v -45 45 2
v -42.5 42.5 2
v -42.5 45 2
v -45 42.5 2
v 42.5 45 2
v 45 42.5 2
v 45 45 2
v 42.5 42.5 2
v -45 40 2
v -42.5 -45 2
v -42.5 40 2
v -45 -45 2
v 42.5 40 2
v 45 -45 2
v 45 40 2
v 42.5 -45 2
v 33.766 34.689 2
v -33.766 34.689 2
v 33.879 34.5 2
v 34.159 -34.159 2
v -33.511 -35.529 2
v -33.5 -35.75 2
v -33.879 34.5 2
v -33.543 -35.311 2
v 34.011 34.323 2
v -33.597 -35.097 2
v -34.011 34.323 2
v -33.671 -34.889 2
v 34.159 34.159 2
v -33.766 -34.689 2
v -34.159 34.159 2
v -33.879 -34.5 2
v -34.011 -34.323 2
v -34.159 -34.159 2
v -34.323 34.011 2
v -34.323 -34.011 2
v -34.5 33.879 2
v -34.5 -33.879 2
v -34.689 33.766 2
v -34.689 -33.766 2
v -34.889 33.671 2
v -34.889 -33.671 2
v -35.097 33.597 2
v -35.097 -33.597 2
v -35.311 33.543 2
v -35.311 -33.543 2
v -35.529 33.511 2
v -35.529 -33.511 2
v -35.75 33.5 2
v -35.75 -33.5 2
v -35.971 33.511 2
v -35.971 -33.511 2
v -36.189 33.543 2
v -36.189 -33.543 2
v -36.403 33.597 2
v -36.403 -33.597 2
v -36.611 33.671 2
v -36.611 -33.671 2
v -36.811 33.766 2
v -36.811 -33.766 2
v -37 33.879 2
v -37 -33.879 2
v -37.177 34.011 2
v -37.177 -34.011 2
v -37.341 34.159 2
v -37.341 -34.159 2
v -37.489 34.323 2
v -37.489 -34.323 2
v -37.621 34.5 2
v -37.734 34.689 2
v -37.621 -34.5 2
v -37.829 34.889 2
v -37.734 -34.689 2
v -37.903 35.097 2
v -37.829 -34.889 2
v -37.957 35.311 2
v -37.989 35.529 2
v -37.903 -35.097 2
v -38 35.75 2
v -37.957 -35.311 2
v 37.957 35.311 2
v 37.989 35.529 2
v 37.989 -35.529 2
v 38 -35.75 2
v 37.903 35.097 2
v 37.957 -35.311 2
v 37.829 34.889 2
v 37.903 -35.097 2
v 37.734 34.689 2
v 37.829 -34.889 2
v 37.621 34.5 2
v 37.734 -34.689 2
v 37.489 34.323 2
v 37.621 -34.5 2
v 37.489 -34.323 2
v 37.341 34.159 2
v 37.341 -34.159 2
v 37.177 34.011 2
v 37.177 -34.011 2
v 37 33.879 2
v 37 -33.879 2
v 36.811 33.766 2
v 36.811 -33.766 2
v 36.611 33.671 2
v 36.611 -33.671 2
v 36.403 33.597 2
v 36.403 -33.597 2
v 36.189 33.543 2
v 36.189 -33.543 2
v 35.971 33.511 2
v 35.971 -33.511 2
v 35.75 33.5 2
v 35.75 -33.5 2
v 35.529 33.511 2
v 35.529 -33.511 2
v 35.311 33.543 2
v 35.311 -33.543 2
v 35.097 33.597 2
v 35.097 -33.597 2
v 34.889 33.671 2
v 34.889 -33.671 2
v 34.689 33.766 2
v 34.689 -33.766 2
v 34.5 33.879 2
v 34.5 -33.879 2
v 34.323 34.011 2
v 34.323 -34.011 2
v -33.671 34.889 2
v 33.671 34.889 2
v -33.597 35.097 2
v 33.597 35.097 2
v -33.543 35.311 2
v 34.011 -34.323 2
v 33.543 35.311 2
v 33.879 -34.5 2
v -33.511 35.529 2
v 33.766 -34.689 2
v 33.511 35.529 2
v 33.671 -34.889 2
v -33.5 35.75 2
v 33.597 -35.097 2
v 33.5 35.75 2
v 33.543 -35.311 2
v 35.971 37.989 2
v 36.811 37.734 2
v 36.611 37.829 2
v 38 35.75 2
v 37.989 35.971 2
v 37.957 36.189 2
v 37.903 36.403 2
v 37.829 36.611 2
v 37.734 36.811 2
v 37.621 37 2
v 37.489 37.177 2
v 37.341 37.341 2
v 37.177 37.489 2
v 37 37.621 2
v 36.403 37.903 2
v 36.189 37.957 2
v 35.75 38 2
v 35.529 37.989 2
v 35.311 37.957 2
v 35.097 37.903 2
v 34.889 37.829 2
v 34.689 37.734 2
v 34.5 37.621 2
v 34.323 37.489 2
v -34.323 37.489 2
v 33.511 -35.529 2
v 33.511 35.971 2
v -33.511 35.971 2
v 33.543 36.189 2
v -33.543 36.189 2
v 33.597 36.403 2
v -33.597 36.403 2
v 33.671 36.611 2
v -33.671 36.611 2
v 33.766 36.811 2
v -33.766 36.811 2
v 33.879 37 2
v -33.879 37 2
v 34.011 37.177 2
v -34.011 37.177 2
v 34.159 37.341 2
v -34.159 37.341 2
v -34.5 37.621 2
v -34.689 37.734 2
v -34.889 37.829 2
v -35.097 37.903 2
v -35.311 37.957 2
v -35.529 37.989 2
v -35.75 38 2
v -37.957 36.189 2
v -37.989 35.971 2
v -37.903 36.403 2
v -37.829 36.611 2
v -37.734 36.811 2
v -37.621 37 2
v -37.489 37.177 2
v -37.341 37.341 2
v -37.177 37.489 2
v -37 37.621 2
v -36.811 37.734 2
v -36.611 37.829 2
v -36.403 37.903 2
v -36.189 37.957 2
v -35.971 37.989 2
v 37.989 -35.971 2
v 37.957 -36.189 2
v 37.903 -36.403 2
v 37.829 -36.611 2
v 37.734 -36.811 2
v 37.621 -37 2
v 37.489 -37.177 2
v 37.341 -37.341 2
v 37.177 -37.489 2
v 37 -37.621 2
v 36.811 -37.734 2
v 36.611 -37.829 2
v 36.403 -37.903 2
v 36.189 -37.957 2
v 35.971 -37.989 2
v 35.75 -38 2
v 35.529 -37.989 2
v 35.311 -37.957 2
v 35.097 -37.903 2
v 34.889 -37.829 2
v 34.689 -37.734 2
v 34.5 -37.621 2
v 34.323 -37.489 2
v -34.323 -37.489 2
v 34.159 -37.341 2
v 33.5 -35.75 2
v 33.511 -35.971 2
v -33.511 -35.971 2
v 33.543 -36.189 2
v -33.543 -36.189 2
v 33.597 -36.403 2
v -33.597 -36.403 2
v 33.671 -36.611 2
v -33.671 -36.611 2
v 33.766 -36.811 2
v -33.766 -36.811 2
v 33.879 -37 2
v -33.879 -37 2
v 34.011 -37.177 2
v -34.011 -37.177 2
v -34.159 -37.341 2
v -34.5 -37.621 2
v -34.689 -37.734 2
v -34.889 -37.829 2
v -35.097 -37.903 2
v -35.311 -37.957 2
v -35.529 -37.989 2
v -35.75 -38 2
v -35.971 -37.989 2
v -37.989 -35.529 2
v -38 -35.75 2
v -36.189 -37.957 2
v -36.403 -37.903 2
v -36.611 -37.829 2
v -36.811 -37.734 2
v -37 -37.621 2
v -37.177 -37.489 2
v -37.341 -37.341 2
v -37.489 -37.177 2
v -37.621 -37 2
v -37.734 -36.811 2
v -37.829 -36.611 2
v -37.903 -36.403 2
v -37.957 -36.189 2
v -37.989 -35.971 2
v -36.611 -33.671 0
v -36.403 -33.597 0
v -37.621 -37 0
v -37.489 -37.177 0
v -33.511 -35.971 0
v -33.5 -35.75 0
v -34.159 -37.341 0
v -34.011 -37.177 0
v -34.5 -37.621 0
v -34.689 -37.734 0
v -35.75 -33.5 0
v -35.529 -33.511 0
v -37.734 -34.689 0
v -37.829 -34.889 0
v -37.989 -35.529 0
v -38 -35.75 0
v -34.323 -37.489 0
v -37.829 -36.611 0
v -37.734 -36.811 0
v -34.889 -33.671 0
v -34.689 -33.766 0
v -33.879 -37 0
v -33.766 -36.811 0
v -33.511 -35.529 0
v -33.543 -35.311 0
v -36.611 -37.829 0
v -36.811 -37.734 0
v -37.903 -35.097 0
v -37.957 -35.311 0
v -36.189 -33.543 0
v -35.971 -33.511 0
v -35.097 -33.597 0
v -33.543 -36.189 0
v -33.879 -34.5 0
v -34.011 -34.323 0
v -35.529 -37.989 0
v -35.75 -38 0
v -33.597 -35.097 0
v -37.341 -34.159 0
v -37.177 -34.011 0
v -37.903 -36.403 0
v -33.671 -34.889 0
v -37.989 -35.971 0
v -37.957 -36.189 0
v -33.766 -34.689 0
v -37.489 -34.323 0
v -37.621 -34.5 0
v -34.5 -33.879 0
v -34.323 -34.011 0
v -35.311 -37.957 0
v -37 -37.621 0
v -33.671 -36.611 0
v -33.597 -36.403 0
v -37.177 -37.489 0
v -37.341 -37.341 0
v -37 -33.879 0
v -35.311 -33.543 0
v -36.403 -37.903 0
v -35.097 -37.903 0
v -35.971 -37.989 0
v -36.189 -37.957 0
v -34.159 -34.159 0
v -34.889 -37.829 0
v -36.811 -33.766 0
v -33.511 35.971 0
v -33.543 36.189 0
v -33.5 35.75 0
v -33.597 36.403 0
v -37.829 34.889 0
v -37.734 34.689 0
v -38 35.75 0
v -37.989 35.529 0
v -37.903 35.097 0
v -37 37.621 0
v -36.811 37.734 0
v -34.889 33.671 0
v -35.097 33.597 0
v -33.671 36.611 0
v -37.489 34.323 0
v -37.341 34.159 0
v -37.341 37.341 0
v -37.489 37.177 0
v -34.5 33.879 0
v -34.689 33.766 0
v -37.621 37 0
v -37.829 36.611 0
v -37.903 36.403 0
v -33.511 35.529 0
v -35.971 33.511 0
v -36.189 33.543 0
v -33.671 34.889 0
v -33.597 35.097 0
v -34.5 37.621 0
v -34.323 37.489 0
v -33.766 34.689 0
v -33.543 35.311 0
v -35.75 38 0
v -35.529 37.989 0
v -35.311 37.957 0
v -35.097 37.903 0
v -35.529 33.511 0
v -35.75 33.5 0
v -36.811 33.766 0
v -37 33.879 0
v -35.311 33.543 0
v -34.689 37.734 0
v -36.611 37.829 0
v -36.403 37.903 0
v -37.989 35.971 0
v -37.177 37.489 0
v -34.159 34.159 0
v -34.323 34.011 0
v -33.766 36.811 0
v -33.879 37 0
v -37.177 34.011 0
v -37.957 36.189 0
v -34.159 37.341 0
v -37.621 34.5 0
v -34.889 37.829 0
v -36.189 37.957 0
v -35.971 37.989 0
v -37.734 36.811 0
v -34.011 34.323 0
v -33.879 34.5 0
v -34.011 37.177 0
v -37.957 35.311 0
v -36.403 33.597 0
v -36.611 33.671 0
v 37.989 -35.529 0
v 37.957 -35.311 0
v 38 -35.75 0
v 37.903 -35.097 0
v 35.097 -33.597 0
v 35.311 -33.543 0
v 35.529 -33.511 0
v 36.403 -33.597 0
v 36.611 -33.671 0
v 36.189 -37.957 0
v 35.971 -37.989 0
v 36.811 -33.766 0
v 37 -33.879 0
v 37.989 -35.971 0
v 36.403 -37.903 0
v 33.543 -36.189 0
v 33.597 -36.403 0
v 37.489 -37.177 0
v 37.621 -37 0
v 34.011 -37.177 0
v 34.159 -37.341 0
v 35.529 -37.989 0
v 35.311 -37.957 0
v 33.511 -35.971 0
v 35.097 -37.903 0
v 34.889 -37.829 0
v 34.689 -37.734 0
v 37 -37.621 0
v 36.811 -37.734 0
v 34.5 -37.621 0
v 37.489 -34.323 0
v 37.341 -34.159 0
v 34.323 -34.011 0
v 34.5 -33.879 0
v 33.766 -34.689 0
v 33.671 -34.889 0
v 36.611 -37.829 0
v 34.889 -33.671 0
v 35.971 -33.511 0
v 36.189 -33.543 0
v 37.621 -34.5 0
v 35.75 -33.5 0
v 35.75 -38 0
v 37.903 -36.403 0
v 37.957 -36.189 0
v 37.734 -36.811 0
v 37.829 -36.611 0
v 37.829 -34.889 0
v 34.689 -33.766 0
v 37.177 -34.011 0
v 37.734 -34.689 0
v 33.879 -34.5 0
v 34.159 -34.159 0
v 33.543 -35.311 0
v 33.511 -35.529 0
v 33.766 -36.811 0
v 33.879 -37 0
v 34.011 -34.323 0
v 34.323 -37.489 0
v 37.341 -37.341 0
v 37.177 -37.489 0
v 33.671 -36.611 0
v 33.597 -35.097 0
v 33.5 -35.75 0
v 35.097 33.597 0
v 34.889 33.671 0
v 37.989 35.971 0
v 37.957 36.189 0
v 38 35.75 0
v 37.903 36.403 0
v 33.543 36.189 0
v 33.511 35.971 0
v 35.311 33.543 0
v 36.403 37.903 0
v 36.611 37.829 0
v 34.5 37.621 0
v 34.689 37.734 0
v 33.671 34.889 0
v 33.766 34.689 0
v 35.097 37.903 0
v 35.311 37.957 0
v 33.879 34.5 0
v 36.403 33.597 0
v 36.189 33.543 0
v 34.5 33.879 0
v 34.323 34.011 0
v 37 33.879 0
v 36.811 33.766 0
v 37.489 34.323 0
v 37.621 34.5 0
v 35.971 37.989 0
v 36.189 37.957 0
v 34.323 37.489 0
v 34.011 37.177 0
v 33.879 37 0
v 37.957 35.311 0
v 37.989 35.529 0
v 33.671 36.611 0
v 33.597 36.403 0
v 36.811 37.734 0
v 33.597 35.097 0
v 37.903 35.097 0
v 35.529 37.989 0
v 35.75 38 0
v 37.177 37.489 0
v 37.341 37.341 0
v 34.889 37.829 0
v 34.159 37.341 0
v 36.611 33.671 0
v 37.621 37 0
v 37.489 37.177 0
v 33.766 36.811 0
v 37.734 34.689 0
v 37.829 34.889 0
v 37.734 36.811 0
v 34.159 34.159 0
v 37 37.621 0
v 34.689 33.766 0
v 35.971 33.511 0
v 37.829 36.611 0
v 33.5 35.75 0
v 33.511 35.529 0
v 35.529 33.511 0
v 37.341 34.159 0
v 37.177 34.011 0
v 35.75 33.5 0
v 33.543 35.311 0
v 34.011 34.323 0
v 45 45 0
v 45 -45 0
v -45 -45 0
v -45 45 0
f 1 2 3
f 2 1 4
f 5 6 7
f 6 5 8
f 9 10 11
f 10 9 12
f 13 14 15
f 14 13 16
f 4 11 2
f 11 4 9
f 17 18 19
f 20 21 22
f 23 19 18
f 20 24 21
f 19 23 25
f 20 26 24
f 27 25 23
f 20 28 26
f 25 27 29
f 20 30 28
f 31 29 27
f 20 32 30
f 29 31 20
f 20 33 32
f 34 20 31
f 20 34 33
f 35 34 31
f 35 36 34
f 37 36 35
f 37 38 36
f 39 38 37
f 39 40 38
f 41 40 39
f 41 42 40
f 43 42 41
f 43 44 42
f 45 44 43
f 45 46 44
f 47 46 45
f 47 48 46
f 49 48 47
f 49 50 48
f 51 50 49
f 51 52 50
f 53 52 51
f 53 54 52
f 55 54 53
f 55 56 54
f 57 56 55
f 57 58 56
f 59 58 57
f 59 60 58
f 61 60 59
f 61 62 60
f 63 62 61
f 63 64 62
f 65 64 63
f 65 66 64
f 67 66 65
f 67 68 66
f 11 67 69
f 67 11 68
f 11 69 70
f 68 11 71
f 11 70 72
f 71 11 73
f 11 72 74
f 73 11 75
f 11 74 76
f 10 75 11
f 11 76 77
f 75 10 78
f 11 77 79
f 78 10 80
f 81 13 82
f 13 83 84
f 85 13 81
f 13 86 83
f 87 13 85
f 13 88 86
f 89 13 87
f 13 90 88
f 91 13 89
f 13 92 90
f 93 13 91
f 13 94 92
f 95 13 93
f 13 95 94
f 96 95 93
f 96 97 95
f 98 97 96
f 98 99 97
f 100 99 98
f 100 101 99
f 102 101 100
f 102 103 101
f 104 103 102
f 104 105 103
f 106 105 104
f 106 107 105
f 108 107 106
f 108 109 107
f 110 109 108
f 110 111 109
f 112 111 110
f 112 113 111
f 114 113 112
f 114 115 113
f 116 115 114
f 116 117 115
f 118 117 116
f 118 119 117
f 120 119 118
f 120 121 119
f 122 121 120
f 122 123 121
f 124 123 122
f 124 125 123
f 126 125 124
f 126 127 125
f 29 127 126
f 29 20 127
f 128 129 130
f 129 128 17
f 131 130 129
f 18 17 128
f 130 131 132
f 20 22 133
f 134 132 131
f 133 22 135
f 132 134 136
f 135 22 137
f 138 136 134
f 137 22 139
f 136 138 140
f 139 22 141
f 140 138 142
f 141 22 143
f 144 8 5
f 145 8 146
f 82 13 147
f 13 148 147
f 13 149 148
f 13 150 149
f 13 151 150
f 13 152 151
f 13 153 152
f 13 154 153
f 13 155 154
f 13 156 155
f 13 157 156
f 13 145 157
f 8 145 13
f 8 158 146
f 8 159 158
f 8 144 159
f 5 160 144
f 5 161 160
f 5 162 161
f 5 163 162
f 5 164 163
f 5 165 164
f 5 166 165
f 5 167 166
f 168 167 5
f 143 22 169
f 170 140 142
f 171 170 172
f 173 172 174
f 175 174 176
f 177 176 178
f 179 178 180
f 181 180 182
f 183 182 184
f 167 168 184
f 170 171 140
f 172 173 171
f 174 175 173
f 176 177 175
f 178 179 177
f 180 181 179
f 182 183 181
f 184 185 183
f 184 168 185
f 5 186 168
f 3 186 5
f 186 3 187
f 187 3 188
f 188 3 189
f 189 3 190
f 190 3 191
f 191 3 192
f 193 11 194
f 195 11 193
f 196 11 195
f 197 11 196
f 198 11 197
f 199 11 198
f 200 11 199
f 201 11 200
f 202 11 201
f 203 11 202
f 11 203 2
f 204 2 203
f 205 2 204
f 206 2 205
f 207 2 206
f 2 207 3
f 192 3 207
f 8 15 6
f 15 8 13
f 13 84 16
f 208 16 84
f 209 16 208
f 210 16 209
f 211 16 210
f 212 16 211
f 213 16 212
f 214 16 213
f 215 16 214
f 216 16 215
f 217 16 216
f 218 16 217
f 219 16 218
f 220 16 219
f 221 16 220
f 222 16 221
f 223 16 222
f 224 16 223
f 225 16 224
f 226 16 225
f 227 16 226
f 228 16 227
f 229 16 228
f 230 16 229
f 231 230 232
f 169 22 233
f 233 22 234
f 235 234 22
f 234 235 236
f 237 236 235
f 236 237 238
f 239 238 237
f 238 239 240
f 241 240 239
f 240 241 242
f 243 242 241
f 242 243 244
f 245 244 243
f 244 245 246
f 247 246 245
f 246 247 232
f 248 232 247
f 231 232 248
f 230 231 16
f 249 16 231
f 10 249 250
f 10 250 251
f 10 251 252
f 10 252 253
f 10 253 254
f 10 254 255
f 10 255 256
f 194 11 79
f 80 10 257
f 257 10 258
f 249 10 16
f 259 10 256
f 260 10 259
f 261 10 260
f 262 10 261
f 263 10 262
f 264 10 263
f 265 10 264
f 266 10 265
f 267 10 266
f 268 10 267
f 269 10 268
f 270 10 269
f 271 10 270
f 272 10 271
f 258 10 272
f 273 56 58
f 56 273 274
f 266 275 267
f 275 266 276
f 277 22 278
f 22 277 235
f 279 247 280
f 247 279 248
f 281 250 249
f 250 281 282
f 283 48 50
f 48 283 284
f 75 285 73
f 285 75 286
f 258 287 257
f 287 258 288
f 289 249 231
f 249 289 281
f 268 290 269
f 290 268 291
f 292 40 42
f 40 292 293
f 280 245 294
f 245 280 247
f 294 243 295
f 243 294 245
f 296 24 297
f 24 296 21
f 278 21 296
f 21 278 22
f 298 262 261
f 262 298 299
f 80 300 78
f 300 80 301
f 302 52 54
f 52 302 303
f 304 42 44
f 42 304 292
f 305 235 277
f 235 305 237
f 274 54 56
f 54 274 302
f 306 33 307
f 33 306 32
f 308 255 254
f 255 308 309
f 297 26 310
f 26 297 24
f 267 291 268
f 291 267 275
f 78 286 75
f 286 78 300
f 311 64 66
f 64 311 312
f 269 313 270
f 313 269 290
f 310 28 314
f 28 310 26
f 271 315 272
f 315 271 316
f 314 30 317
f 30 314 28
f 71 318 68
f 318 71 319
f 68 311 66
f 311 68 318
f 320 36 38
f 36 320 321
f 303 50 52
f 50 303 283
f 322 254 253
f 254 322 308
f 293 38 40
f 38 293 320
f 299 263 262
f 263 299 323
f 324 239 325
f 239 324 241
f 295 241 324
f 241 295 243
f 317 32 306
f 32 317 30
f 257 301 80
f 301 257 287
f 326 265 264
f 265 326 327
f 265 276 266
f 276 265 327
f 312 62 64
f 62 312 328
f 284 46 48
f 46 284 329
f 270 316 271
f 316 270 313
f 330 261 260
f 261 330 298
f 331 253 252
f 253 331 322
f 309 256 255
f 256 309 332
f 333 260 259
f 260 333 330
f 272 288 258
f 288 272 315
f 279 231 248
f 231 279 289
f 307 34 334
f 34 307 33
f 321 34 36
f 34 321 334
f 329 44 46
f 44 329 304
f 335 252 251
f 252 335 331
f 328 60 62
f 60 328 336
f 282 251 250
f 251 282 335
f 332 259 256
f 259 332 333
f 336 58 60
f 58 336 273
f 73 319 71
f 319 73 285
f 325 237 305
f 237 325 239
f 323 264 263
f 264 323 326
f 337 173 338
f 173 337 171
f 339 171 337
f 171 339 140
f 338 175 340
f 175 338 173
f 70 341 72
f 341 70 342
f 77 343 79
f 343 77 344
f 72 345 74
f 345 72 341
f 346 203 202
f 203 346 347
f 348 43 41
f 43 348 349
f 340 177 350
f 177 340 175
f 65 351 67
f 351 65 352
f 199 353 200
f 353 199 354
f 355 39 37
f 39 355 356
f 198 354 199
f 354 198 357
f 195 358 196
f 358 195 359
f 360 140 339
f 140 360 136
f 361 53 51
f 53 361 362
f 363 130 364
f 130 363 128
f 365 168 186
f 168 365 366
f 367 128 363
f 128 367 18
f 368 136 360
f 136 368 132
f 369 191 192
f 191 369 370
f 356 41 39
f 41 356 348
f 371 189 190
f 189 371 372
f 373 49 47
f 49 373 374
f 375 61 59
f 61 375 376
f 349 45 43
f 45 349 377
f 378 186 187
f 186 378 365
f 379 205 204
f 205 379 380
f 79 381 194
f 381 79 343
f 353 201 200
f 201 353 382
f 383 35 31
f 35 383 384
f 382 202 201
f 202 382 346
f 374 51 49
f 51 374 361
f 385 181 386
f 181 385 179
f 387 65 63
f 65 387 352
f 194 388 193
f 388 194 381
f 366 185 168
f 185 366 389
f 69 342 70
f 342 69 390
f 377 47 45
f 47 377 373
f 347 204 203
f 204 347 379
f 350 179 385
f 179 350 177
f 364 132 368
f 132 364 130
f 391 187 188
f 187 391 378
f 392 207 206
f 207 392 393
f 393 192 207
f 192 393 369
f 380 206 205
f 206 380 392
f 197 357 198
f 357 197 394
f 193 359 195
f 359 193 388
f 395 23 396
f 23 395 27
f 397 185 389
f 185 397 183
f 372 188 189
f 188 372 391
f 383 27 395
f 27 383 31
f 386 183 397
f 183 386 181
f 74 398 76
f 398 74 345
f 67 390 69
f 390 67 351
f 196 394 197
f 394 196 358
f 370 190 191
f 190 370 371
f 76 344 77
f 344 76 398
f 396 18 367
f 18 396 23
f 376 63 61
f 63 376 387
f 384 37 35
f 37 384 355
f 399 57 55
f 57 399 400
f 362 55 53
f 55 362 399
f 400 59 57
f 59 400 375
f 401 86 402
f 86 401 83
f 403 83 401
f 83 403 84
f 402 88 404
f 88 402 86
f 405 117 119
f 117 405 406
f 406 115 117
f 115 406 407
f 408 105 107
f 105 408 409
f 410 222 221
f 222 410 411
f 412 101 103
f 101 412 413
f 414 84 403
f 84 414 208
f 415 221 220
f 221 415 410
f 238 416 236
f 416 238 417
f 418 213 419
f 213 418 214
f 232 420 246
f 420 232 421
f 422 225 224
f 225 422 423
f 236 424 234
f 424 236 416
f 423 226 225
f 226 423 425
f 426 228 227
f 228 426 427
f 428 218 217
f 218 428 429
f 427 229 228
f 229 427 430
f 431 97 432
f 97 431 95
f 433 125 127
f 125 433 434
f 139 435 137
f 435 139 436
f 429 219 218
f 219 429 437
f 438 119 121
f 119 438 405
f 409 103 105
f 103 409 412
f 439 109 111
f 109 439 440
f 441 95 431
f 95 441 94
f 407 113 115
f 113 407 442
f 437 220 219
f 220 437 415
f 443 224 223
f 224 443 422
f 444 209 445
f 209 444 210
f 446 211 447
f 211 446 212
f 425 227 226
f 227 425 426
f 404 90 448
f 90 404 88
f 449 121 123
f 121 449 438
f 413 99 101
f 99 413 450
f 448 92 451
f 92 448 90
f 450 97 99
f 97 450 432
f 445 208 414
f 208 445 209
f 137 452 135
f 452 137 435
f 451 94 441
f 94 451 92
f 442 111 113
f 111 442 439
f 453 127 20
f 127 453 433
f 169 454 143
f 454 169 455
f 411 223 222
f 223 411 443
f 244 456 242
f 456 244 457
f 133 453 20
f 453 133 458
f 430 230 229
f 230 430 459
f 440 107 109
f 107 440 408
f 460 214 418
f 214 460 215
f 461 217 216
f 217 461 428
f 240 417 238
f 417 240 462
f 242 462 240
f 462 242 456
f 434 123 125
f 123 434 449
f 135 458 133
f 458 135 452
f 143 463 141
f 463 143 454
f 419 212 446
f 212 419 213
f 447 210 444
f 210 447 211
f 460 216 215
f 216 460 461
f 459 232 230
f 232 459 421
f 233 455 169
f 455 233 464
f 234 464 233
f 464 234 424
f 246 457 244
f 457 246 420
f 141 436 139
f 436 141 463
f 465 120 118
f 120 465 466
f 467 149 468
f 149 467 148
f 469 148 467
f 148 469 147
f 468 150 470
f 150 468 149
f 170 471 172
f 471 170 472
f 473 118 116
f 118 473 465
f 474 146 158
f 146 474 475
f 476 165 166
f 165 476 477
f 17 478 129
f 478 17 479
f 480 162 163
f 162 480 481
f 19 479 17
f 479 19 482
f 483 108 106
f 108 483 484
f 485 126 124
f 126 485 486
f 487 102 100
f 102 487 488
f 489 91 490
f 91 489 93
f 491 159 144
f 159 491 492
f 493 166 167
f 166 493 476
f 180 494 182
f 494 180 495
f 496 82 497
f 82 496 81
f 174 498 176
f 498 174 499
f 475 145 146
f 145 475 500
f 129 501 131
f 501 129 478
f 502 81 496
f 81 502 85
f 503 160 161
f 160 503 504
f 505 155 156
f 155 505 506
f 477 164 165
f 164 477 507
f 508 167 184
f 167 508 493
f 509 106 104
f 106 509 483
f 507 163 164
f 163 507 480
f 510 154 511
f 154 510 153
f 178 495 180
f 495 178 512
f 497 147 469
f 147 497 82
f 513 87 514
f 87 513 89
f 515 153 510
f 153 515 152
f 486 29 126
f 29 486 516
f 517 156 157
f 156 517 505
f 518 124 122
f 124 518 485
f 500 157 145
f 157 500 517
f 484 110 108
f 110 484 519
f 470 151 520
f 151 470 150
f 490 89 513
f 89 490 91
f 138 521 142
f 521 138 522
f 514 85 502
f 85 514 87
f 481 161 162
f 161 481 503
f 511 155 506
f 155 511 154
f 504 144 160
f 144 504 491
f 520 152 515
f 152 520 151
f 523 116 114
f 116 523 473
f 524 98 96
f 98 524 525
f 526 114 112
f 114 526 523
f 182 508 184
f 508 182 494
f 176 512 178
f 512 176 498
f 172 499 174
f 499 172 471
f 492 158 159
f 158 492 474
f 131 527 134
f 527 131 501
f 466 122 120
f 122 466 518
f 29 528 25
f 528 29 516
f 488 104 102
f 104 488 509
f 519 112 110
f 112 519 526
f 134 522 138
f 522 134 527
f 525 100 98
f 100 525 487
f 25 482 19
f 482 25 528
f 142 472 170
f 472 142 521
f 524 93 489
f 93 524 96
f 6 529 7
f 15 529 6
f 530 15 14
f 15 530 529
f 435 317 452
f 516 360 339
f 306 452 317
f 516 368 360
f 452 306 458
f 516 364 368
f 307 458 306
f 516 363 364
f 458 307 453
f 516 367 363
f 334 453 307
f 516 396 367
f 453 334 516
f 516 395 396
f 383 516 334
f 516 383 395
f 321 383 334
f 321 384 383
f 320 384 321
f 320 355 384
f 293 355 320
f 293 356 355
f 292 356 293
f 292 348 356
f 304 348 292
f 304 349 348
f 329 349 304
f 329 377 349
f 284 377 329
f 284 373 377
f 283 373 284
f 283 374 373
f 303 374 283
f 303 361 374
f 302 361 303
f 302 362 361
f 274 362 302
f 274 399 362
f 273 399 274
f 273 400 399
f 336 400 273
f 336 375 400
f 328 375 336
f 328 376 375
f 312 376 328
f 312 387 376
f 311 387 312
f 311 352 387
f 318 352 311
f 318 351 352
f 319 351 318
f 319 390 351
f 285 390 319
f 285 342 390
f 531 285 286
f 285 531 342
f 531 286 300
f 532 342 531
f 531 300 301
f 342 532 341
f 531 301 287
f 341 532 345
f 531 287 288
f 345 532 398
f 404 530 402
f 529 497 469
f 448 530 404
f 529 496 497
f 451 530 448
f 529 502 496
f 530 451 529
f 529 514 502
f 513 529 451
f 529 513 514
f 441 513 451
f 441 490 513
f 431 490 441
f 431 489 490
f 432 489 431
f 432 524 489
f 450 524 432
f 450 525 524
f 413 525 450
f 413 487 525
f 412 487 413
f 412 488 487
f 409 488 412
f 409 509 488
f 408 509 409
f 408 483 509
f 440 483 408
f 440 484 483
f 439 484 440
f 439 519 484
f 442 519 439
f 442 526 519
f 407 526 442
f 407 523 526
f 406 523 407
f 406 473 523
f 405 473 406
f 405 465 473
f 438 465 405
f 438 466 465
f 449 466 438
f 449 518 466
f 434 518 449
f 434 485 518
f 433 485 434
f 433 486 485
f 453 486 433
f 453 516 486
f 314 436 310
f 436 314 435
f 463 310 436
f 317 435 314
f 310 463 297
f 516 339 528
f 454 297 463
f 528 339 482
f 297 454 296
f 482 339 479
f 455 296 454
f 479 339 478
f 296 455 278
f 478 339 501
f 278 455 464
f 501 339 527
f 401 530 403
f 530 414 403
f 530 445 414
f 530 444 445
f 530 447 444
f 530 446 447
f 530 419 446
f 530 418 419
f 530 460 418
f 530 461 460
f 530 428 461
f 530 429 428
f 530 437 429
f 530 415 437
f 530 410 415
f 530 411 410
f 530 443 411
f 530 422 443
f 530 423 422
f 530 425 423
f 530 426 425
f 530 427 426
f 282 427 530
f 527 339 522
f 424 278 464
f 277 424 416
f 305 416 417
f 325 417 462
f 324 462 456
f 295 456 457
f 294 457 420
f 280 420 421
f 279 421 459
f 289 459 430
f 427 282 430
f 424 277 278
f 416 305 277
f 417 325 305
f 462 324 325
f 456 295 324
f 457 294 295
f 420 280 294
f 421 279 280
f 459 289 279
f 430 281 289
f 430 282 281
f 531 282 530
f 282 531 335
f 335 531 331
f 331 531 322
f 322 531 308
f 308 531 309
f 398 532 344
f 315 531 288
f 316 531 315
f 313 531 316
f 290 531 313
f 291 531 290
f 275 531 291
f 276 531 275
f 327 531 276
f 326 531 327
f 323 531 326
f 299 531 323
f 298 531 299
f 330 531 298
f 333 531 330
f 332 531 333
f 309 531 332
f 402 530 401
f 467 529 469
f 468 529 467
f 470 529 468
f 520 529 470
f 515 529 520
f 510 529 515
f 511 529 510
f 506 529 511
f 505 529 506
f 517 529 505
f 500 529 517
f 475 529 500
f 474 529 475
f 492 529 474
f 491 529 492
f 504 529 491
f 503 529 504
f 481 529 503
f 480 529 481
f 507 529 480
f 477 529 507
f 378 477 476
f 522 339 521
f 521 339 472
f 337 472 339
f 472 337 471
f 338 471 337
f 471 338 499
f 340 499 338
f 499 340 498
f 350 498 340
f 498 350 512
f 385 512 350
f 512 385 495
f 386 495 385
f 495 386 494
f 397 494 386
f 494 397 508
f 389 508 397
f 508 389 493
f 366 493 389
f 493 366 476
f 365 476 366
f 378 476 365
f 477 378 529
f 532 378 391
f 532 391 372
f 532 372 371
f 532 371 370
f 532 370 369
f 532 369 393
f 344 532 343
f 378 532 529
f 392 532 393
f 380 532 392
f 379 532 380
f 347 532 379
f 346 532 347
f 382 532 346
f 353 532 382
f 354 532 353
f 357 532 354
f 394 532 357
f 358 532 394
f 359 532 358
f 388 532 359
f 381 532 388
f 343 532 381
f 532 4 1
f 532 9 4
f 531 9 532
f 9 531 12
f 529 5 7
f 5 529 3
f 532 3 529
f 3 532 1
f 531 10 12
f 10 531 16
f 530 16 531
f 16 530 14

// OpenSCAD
// DIY magnetic stirrer housing for 80 mm PC case fan
// Print orientation: upside down - top plate on bed, open bottom

// ---- Dimensions (mm) ----
plate_t      = 2;     // top plate thickness
wall_t       = 2.5;   // wall thickness
box_h        = 40;    // wall height (z = 2 to 42)
outer_x      = 90;    // outer size X
outer_y      = 90;    // outer size Y
hole_d       = 4.5;   // M4 screw hole diameter
hole_pitch   = 71.5;  // screw hole pattern side length
notch_w      = 12;    // cable notch width
notch_depth  = 8;     // cable notch depth from open edge
eps          = 0.5;   // cutter overshoot

$fn = 64;

// ---- Model ----
difference() {
    // Closed top plate
    translate([-outer_x/2, -outer_y/2, 0])
        cube([outer_x, outer_y, plate_t]);
    
    // Four walls rising from plate to open top
    for (dx = [-1, 1], dy = [-1, 1])
        translate([dx > 0 ? outer_x/2 - wall_t : -outer_x/2,
                   dy > 0 ? outer_y/2 - wall_t : -outer_y/2,
                   plate_t])
            cube([wall_t, outer_y - 2*wall_t, box_h]);
    
    // Screw holes through top plate
    for (i = [0:1], j = [0:1])
        translate([(i - 0.5)*hole_pitch, (j - 0.5)*hole_pitch, -eps])
            cylinder(d = hole_d, h = plate_t + 2*eps);
    
    // Cable notch in one wall (reaches from z = 32 to open edge at z = 42)
    translate([-outer_x/2 + wall_t, -outer_y/2, plate_t + wall_t])
        cube([outer_x - 2*wall_t, notch_w, notch_depth]);
}
